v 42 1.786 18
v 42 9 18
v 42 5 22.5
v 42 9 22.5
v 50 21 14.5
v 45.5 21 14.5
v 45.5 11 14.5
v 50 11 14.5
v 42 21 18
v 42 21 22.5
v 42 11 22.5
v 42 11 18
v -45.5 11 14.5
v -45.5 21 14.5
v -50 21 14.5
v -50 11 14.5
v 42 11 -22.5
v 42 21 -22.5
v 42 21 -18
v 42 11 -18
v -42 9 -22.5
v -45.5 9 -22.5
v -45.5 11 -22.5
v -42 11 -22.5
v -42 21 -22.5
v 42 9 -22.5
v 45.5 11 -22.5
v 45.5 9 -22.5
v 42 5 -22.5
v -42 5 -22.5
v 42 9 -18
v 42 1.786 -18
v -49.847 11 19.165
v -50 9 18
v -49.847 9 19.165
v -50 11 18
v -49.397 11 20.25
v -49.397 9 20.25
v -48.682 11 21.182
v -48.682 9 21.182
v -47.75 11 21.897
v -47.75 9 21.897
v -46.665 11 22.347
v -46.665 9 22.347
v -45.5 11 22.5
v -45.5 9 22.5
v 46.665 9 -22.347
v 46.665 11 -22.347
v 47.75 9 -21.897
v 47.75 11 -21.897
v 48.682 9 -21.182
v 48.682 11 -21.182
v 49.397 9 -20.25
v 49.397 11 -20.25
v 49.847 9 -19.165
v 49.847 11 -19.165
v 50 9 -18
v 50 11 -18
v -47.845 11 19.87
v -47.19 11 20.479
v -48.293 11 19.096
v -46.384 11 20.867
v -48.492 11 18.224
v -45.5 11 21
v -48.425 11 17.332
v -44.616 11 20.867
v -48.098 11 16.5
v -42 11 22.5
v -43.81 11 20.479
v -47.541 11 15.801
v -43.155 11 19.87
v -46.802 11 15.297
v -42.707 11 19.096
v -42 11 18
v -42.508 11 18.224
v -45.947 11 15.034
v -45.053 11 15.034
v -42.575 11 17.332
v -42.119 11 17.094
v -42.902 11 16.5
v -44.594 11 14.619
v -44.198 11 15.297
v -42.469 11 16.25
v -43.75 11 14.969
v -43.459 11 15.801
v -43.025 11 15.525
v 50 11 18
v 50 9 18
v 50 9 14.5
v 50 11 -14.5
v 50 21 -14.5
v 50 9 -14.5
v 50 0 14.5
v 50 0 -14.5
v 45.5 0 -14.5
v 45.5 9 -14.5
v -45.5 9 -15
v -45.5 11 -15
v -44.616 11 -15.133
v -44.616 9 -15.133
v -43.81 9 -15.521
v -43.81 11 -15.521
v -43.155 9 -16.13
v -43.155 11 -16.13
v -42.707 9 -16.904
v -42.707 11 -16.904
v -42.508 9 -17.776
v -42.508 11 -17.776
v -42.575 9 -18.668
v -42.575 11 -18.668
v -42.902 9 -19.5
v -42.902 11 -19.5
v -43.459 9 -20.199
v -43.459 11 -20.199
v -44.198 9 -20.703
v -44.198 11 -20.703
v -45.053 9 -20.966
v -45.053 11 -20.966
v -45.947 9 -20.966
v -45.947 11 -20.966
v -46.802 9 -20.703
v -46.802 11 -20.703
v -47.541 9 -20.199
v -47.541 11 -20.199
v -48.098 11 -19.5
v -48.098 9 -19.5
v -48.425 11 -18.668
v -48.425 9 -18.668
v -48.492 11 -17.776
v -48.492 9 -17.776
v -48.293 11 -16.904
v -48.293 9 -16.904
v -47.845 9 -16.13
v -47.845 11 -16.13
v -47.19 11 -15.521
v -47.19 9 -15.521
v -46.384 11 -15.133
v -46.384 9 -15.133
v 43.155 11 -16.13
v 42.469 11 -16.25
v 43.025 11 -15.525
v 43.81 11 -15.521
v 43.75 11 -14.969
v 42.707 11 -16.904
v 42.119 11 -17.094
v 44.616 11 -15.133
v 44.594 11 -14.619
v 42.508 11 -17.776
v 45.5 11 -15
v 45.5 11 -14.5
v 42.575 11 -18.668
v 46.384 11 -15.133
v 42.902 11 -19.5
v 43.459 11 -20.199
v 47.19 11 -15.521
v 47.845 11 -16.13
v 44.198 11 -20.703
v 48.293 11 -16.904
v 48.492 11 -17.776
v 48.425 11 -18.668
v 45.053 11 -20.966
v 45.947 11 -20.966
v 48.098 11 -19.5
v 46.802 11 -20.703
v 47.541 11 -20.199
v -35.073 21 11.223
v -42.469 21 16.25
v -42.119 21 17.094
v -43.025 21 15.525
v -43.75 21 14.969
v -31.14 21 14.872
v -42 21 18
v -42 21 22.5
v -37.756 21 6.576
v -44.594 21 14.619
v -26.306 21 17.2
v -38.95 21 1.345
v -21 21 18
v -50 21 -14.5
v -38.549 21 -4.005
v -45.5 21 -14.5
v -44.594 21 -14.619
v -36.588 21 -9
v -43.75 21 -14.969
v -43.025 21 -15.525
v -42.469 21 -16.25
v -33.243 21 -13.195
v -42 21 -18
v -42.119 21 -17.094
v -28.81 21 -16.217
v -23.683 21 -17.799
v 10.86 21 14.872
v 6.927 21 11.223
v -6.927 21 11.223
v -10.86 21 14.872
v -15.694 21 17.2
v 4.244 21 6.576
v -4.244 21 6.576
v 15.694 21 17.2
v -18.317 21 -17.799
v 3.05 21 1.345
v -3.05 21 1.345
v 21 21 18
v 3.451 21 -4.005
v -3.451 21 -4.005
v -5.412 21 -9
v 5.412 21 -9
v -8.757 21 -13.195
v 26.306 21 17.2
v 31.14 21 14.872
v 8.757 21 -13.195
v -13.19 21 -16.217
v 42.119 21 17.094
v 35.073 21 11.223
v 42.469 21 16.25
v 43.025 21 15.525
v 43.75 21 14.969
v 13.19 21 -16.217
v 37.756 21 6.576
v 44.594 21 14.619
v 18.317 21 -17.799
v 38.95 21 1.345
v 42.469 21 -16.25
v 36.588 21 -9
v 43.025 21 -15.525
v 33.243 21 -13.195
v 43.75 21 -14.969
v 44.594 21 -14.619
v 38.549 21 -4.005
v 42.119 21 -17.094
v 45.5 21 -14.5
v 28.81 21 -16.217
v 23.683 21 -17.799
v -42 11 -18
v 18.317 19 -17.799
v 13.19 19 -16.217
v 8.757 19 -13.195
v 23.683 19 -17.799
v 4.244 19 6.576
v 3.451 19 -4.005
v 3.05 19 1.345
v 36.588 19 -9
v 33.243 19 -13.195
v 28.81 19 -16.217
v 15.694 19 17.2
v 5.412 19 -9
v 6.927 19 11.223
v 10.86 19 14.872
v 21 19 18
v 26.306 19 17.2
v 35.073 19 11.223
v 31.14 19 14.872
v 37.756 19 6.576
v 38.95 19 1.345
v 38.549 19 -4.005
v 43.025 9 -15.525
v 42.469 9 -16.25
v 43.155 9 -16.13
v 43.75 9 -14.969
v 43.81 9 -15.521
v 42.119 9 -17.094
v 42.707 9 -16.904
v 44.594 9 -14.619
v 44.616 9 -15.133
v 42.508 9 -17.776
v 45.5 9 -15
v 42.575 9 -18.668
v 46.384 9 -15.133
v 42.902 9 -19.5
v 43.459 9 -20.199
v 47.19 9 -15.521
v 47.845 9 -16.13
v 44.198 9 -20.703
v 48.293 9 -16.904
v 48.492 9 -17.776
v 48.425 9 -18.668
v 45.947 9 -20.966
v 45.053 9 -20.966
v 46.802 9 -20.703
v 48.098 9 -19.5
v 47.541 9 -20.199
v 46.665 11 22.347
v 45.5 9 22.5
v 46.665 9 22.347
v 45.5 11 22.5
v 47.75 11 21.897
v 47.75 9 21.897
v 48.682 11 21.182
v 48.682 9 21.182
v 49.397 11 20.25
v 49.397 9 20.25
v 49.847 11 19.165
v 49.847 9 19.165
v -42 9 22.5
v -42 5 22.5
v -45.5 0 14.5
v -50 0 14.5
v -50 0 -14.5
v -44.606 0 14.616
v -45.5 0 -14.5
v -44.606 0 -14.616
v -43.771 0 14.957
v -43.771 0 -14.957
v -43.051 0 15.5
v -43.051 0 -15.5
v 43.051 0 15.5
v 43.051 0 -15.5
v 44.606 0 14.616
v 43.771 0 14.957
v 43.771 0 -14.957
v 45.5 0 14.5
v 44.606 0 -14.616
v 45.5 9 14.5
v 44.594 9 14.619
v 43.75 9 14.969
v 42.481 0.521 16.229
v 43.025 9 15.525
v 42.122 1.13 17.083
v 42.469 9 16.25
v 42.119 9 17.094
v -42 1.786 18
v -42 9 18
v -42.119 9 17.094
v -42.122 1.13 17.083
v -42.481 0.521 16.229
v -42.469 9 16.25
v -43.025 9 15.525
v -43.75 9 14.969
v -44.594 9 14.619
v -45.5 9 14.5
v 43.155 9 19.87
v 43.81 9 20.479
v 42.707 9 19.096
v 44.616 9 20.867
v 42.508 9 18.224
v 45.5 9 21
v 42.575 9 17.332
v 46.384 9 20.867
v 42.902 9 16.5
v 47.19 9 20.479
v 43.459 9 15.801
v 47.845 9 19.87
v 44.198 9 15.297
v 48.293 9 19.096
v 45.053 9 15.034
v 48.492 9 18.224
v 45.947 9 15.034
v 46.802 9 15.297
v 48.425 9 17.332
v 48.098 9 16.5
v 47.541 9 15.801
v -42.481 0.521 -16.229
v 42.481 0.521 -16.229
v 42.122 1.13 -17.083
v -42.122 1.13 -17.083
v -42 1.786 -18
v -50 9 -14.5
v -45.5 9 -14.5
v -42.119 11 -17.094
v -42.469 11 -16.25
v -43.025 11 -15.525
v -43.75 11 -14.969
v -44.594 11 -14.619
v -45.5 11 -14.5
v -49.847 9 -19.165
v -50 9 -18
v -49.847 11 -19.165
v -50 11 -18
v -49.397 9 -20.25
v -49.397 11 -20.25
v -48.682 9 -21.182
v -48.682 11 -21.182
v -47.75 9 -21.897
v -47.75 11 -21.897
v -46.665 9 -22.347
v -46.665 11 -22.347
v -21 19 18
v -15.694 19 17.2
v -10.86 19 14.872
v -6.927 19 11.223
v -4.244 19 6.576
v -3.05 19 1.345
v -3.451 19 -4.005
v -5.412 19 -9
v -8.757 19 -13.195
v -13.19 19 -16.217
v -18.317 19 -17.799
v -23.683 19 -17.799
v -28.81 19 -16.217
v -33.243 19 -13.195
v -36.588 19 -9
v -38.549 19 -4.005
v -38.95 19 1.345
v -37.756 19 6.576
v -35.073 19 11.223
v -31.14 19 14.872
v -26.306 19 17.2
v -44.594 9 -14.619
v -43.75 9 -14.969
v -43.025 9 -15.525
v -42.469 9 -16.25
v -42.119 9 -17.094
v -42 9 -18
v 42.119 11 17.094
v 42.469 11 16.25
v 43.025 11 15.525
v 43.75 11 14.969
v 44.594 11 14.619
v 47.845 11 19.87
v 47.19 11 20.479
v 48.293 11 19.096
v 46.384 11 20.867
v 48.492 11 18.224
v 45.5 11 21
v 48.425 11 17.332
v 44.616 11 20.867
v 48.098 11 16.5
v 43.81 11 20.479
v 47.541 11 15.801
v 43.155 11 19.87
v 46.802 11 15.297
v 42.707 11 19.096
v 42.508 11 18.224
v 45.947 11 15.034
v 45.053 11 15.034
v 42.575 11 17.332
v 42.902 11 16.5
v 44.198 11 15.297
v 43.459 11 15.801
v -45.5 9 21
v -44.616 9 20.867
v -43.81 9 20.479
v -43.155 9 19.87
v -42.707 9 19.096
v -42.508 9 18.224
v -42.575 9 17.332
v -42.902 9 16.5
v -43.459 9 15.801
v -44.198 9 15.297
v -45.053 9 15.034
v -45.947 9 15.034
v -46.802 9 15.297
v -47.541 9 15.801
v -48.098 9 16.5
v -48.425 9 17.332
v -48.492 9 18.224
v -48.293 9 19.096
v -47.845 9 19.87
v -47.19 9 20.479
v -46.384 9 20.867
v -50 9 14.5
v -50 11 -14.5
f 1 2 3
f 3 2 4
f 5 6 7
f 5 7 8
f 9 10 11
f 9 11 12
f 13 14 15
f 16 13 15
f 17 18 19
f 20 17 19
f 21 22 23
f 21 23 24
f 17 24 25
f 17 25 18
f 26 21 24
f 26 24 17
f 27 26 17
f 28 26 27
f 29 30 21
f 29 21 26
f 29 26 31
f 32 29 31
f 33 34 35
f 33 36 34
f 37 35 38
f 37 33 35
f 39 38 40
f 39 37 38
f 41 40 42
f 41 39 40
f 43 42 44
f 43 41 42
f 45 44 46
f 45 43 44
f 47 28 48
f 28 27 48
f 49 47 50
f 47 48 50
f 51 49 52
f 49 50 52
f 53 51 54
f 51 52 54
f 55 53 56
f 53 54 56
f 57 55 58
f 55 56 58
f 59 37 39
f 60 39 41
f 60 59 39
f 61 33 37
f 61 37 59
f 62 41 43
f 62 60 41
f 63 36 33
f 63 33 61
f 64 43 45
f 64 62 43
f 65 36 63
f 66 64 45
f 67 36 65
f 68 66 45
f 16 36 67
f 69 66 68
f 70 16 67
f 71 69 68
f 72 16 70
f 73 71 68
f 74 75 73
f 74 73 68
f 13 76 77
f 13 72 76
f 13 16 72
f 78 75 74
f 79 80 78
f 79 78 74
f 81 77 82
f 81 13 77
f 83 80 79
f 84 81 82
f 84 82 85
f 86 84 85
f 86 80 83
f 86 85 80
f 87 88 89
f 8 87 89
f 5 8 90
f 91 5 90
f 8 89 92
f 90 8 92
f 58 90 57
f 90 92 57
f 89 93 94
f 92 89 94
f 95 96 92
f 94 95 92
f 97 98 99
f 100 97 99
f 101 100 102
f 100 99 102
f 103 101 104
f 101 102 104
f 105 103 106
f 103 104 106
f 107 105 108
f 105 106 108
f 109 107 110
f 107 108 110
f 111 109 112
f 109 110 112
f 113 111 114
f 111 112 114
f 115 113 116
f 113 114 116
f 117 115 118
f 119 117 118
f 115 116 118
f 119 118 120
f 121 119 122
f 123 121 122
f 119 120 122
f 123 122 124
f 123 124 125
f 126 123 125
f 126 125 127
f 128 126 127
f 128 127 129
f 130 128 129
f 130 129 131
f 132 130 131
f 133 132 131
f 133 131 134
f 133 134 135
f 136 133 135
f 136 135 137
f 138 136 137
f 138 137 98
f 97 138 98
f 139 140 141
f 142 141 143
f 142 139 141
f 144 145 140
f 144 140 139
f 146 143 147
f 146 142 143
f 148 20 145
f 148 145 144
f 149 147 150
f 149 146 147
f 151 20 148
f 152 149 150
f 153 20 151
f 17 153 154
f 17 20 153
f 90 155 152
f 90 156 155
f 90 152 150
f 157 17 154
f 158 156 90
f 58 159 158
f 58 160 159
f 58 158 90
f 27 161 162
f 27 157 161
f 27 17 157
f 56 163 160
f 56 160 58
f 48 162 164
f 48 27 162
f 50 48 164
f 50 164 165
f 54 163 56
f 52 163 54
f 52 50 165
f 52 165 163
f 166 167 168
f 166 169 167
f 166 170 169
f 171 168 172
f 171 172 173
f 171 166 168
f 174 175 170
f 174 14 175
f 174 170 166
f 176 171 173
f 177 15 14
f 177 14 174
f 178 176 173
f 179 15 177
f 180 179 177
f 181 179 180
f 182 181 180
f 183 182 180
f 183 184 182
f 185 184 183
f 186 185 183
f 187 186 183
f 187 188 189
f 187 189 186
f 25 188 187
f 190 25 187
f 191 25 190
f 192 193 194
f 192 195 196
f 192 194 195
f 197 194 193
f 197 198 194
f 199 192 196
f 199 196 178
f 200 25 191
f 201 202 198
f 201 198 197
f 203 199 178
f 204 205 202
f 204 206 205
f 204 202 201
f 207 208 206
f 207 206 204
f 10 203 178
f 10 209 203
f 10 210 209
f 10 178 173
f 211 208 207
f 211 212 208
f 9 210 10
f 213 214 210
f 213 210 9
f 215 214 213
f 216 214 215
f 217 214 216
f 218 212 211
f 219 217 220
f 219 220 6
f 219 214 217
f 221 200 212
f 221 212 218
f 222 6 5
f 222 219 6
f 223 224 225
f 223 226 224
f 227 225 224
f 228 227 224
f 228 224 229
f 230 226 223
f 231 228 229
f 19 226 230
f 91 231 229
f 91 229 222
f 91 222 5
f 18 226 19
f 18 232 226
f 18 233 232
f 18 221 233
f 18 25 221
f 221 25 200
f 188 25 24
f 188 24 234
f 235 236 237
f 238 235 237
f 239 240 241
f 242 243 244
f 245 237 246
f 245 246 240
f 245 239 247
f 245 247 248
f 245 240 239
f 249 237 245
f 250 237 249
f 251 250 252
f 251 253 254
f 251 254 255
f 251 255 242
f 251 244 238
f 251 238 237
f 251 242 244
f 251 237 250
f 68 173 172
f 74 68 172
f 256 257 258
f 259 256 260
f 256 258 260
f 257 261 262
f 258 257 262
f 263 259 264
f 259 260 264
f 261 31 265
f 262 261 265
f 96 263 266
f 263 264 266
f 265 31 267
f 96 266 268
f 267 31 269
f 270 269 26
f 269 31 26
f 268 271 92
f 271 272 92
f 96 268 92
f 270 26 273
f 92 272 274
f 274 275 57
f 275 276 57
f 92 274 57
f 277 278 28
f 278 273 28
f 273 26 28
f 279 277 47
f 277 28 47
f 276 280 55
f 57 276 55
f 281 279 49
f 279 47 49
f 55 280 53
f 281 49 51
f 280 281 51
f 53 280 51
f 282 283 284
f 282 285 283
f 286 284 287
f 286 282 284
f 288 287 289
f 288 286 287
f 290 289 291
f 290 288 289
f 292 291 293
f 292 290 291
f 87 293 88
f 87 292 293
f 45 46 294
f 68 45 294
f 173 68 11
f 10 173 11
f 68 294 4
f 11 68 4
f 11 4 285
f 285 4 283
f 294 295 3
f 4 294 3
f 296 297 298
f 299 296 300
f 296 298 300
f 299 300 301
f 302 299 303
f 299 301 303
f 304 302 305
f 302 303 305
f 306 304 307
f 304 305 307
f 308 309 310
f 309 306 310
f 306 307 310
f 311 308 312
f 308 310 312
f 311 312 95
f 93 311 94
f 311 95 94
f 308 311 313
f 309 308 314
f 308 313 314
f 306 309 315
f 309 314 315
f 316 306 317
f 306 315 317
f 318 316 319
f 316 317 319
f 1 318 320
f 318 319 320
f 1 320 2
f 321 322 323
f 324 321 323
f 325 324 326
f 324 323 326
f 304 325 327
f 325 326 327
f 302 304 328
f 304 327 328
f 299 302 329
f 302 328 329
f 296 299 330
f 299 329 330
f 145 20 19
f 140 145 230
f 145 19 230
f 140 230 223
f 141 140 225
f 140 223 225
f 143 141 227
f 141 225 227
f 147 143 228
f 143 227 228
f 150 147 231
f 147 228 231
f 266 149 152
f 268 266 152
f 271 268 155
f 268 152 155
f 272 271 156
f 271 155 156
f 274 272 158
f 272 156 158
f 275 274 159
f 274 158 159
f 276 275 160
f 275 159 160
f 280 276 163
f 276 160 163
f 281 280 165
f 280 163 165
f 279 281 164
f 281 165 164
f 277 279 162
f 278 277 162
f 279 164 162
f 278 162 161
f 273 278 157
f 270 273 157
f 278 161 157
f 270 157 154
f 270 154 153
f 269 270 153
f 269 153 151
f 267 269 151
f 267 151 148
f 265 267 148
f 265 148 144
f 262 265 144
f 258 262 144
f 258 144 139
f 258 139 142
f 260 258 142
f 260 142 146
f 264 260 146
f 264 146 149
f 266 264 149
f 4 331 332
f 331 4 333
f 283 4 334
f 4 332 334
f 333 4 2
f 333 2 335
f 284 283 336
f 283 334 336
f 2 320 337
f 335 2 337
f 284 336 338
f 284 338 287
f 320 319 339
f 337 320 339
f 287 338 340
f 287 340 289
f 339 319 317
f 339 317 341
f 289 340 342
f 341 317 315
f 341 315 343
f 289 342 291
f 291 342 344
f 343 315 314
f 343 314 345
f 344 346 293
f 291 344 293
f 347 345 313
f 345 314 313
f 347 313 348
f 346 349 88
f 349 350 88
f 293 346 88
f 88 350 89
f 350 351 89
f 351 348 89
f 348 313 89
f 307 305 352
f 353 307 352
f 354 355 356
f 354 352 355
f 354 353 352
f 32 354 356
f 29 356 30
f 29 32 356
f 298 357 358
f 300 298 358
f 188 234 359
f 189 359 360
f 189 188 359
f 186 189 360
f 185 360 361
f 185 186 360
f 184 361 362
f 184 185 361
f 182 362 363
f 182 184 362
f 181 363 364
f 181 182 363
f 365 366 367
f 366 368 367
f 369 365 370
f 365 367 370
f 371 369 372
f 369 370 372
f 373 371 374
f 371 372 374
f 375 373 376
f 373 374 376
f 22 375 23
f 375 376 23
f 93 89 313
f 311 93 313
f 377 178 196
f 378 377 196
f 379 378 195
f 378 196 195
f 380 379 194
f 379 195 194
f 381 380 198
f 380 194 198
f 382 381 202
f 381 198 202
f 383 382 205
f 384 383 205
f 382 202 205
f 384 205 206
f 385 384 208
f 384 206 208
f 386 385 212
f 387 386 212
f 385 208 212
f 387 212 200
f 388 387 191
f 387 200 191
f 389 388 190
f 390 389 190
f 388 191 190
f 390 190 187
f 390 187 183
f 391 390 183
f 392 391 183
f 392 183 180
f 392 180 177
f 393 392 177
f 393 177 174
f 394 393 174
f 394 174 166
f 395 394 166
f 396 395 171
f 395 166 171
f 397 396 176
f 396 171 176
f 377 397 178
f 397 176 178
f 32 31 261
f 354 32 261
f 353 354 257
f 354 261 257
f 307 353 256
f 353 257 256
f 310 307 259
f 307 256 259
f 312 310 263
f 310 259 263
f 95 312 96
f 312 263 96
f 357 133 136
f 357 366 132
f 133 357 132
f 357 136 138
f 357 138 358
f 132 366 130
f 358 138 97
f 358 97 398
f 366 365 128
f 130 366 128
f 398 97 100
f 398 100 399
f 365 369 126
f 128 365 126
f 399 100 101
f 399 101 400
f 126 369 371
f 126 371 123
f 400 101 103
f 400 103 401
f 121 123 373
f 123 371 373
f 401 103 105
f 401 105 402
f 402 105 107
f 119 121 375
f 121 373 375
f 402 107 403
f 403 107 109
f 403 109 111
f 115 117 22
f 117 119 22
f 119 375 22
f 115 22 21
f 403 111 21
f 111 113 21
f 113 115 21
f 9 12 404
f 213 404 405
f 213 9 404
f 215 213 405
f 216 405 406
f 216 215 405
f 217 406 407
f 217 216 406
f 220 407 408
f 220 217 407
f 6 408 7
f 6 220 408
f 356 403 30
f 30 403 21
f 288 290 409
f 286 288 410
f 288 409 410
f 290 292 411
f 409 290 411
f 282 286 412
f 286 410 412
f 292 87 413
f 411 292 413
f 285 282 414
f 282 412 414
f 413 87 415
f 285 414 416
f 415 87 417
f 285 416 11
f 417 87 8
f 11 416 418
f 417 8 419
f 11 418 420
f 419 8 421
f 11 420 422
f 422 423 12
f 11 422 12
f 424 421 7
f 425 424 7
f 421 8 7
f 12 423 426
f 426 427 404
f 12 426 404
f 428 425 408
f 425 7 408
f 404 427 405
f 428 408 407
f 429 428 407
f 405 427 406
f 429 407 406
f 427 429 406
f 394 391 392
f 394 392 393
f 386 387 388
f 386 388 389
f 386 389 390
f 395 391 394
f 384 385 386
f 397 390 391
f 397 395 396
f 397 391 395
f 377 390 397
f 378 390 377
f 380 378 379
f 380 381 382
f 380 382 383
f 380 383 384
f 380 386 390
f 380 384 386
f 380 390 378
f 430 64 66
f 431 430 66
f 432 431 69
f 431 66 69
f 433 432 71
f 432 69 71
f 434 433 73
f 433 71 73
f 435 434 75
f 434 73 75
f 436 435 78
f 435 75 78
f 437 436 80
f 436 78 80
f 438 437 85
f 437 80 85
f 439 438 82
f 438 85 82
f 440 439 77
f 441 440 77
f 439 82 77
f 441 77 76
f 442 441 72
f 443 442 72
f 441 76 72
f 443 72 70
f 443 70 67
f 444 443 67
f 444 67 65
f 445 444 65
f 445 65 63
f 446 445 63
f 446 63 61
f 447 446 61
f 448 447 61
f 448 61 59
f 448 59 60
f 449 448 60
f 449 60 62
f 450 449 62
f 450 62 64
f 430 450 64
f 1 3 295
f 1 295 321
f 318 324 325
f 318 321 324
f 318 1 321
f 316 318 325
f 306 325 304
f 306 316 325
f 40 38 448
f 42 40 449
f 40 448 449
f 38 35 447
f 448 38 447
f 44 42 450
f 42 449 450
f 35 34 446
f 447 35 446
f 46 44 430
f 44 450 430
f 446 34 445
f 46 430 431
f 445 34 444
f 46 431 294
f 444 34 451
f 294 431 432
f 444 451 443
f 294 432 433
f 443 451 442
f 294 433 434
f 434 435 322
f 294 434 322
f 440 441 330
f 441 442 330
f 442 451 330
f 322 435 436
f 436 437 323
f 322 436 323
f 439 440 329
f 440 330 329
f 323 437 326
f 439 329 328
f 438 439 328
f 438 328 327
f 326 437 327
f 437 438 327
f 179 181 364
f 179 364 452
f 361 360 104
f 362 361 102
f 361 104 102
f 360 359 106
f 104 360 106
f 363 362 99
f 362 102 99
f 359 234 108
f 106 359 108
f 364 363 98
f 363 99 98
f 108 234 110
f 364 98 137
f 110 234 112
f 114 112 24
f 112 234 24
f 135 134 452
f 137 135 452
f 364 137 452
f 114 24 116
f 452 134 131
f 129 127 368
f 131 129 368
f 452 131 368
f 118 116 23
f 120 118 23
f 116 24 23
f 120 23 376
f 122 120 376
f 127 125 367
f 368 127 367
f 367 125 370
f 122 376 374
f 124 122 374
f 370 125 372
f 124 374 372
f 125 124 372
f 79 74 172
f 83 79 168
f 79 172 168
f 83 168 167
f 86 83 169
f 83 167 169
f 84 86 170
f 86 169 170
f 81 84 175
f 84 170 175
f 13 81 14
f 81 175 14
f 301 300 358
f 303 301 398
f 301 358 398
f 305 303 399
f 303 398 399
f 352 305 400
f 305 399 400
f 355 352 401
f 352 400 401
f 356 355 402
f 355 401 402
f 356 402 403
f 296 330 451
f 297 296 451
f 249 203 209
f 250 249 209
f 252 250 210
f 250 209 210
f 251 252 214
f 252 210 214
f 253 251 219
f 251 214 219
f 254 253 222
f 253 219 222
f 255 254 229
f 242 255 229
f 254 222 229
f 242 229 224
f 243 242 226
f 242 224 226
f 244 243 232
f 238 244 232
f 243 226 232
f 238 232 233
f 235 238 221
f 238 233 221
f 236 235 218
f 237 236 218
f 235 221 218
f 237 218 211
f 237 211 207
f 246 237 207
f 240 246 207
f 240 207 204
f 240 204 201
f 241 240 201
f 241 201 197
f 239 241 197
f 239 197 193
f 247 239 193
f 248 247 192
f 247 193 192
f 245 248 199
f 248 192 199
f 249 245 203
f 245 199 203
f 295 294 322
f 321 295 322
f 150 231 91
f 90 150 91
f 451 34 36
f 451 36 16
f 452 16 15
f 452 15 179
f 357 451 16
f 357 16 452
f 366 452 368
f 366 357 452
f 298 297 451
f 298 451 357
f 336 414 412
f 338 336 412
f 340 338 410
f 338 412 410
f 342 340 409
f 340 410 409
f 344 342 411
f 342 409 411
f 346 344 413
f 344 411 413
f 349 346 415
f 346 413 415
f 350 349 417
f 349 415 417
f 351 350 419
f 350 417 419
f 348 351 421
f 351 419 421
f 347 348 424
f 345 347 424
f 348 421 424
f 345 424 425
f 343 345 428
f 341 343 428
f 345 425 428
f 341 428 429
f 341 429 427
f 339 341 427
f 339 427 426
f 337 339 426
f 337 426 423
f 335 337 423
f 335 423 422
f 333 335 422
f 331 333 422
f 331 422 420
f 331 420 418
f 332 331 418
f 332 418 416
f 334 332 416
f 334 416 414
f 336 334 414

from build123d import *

# Parameters (mm, degrees)
SKETCH1_W           = 100
SKETCH1_H           = 45
BOSS_EXTRUDE1_DEPTH = 21
CUT_EXTRUDE1_DEPTH  = 105.629106849
CUT_EXTRUDE2_DEPTH  = 10
CUT_EXTRUDE3_DEPTH  = 57.127087934
SKETCH6_R           = 3
CUT_EXTRUDE4_DEPTH  = 56.921820428
FILLET1_R           = 4.5
SKETCH7_R           = 18
CUT_EXTRUDE5_DEPTH  = 2


with BuildPart() as part:
    # Sketch1 → Boss-Extrude1 (new body)
    with BuildSketch(Plane(origin=(0, 0, 0), x_dir=(1, 0, 0), z_dir=(0, 1, 0))):
        Rectangle(SKETCH1_W, SKETCH1_H)
    extrude(amount=BOSS_EXTRUDE1_DEPTH)

    # Sketch2 → Cut-Extrude1 (cut, through all)
    with BuildSketch(Plane(origin=(50, 0, 0), x_dir=(0, 0, -1), z_dir=(1, 0, 0))):
        Polygon((-22.5, 0), (-22.5, 5), (-15.5, 0), align=None)
        Polygon((22.5, 0), (15.5, 0), (22.5, 5), align=None)
    extrude(amount=-CUT_EXTRUDE1_DEPTH, mode=Mode.SUBTRACT)

    # Sketch3 → Cut-Extrude2 (cut)
    with BuildSketch(Plane(origin=(0, 21, 0), x_dir=(1, 0, 0), z_dir=(0, 1, 0))):
        with BuildLine():
            Line((-42, 22.5), (-42, 18))
            ThreePointArc((-42, 18), (-43.025126266, 15.525126266), (-45.5, 14.5))
            Line((-45.5, 14.5), (-50, 14.5))
            Line((-50, 14.5), (-50, 22.5))
            Line((-50, 22.5), (-42, 22.5))
        make_face()
        with BuildLine():
            Line((-50, -22.5), (-42, -22.5))
            Line((-42, -22.5), (-42, -18))
            ThreePointArc((-42, -18), (-43.025126266, -15.525126266), (-45.5, -14.5))
            Line((-45.5, -14.5), (-50, -14.5))
            Line((-50, -14.5), (-50, -22.5))
        make_face()
        with BuildLine():
            Line((42, -22.5), (42, -18))
            ThreePointArc((42, -18), (43.025126266, -15.525126266), (45.5, -14.5))
            Line((45.5, -14.5), (50, -14.5))
            Line((50, -14.5), (50, -22.5))
            Line((50, -22.5), (42, -22.5))
        make_face()
        with BuildLine():
            Line((50, 22.5), (42, 22.5))
            Line((42, 22.5), (42, 18))
            ThreePointArc((42, 18), (43.025126266, 15.525126266), (45.5, 14.5))
            Line((45.5, 14.5), (50, 14.5))
            Line((50, 14.5), (50, 22.5))
        make_face()
    extrude(amount=-CUT_EXTRUDE2_DEPTH, mode=Mode.SUBTRACT)

    # Sketch5 → Cut-Extrude3 (cut, through all)
    with BuildSketch(Plane(origin=(0, 9, 0), x_dir=(1, 0, 0), z_dir=(0, 1, 0))):
        with BuildLine():
            Line((-45.5, -14.5), (-50, -14.5))
            Line((-50, -14.5), (-50, -22.5))
            Line((-50, -22.5), (-42, -22.5))
            Line((-42, -22.5), (-42, -18))
            ThreePointArc((-42, -18), (-43.025126266, -15.525126266), (-45.5, -14.5))
        make_face()
        with BuildLine():
            Line((42, -18), (42, -22.5))
            Line((42, -22.5), (50, -22.5))
            Line((50, -22.5), (50, -14.5))
            Line((50, -14.5), (45.5, -14.5))
            ThreePointArc((45.5, -14.5), (43.025126266, -15.525126266), (42, -18))
        make_face()
        with BuildLine():
            Line((45.5, 14.5), (50, 14.5))
            Line((50, 14.5), (50, 22.5))
            Line((50, 22.5), (42, 22.5))
            Line((42, 22.5), (42, 18))
            ThreePointArc((42, 18), (43.025126266, 15.525126266), (45.5, 14.5))
        make_face()
        with BuildLine():
            Line((-42, 22.5), (-50, 22.5))
            Line((-50, 22.5), (-50, 14.5))
            Line((-50, 14.5), (-45.5, 14.5))
            ThreePointArc((-45.5, 14.5), (-43.025126266, 15.525126266), (-42, 18))
            Line((-42, 18), (-42, 22.5))
        make_face()
    extrude(amount=-CUT_EXTRUDE3_DEPTH, mode=Mode.SUBTRACT)

    # Sketch6 → Cut-Extrude4 (cut, through all)
    with BuildSketch(Plane(origin=(0, 11, 0), x_dir=(1, 0, 0), z_dir=(0, 1, 0))):
        with Locations(Location((-45.5, 18, 0), (0, 0, 270))):
            Circle(SKETCH6_R)
        with Locations(Location((-45.5, -18, 0), (0, 0, 270))):
            Circle(SKETCH6_R)
        with Locations(Location((45.5, -18, 0), (0, 0, 270))):
            Circle(SKETCH6_R)
        with Locations(Location((45.5, 18, 0), (0, 0, 270))):
            Circle(SKETCH6_R)
    extrude(amount=-CUT_EXTRUDE4_DEPTH, mode=Mode.SUBTRACT)

    # Fillet1
    fillet1_edges = [part.edges().sort_by_distance(p)[0] for p in [
        (-50, 10, 22.5),
        (50, 10, 22.5),
        (-50, 10, -22.5),
        (50, 10, -22.5),
    ]]
    fillet(fillet1_edges, radius=FILLET1_R)

    # Sketch7 → Cut-Extrude5 (cut)
    with BuildSketch(Plane(origin=(0, 21, 0), x_dir=(1, 0, 0), z_dir=(0, 1, 0))):
        with Locations(Location((-21, 0, 0), (0, 0, 270))):
            Circle(SKETCH7_R)
        with Locations(Location((21, 0, 0), (0, 0, 270))):
            Circle(SKETCH7_R)
    extrude(amount=-CUT_EXTRUDE5_DEPTH, mode=Mode.SUBTRACT)


solid = part.part
